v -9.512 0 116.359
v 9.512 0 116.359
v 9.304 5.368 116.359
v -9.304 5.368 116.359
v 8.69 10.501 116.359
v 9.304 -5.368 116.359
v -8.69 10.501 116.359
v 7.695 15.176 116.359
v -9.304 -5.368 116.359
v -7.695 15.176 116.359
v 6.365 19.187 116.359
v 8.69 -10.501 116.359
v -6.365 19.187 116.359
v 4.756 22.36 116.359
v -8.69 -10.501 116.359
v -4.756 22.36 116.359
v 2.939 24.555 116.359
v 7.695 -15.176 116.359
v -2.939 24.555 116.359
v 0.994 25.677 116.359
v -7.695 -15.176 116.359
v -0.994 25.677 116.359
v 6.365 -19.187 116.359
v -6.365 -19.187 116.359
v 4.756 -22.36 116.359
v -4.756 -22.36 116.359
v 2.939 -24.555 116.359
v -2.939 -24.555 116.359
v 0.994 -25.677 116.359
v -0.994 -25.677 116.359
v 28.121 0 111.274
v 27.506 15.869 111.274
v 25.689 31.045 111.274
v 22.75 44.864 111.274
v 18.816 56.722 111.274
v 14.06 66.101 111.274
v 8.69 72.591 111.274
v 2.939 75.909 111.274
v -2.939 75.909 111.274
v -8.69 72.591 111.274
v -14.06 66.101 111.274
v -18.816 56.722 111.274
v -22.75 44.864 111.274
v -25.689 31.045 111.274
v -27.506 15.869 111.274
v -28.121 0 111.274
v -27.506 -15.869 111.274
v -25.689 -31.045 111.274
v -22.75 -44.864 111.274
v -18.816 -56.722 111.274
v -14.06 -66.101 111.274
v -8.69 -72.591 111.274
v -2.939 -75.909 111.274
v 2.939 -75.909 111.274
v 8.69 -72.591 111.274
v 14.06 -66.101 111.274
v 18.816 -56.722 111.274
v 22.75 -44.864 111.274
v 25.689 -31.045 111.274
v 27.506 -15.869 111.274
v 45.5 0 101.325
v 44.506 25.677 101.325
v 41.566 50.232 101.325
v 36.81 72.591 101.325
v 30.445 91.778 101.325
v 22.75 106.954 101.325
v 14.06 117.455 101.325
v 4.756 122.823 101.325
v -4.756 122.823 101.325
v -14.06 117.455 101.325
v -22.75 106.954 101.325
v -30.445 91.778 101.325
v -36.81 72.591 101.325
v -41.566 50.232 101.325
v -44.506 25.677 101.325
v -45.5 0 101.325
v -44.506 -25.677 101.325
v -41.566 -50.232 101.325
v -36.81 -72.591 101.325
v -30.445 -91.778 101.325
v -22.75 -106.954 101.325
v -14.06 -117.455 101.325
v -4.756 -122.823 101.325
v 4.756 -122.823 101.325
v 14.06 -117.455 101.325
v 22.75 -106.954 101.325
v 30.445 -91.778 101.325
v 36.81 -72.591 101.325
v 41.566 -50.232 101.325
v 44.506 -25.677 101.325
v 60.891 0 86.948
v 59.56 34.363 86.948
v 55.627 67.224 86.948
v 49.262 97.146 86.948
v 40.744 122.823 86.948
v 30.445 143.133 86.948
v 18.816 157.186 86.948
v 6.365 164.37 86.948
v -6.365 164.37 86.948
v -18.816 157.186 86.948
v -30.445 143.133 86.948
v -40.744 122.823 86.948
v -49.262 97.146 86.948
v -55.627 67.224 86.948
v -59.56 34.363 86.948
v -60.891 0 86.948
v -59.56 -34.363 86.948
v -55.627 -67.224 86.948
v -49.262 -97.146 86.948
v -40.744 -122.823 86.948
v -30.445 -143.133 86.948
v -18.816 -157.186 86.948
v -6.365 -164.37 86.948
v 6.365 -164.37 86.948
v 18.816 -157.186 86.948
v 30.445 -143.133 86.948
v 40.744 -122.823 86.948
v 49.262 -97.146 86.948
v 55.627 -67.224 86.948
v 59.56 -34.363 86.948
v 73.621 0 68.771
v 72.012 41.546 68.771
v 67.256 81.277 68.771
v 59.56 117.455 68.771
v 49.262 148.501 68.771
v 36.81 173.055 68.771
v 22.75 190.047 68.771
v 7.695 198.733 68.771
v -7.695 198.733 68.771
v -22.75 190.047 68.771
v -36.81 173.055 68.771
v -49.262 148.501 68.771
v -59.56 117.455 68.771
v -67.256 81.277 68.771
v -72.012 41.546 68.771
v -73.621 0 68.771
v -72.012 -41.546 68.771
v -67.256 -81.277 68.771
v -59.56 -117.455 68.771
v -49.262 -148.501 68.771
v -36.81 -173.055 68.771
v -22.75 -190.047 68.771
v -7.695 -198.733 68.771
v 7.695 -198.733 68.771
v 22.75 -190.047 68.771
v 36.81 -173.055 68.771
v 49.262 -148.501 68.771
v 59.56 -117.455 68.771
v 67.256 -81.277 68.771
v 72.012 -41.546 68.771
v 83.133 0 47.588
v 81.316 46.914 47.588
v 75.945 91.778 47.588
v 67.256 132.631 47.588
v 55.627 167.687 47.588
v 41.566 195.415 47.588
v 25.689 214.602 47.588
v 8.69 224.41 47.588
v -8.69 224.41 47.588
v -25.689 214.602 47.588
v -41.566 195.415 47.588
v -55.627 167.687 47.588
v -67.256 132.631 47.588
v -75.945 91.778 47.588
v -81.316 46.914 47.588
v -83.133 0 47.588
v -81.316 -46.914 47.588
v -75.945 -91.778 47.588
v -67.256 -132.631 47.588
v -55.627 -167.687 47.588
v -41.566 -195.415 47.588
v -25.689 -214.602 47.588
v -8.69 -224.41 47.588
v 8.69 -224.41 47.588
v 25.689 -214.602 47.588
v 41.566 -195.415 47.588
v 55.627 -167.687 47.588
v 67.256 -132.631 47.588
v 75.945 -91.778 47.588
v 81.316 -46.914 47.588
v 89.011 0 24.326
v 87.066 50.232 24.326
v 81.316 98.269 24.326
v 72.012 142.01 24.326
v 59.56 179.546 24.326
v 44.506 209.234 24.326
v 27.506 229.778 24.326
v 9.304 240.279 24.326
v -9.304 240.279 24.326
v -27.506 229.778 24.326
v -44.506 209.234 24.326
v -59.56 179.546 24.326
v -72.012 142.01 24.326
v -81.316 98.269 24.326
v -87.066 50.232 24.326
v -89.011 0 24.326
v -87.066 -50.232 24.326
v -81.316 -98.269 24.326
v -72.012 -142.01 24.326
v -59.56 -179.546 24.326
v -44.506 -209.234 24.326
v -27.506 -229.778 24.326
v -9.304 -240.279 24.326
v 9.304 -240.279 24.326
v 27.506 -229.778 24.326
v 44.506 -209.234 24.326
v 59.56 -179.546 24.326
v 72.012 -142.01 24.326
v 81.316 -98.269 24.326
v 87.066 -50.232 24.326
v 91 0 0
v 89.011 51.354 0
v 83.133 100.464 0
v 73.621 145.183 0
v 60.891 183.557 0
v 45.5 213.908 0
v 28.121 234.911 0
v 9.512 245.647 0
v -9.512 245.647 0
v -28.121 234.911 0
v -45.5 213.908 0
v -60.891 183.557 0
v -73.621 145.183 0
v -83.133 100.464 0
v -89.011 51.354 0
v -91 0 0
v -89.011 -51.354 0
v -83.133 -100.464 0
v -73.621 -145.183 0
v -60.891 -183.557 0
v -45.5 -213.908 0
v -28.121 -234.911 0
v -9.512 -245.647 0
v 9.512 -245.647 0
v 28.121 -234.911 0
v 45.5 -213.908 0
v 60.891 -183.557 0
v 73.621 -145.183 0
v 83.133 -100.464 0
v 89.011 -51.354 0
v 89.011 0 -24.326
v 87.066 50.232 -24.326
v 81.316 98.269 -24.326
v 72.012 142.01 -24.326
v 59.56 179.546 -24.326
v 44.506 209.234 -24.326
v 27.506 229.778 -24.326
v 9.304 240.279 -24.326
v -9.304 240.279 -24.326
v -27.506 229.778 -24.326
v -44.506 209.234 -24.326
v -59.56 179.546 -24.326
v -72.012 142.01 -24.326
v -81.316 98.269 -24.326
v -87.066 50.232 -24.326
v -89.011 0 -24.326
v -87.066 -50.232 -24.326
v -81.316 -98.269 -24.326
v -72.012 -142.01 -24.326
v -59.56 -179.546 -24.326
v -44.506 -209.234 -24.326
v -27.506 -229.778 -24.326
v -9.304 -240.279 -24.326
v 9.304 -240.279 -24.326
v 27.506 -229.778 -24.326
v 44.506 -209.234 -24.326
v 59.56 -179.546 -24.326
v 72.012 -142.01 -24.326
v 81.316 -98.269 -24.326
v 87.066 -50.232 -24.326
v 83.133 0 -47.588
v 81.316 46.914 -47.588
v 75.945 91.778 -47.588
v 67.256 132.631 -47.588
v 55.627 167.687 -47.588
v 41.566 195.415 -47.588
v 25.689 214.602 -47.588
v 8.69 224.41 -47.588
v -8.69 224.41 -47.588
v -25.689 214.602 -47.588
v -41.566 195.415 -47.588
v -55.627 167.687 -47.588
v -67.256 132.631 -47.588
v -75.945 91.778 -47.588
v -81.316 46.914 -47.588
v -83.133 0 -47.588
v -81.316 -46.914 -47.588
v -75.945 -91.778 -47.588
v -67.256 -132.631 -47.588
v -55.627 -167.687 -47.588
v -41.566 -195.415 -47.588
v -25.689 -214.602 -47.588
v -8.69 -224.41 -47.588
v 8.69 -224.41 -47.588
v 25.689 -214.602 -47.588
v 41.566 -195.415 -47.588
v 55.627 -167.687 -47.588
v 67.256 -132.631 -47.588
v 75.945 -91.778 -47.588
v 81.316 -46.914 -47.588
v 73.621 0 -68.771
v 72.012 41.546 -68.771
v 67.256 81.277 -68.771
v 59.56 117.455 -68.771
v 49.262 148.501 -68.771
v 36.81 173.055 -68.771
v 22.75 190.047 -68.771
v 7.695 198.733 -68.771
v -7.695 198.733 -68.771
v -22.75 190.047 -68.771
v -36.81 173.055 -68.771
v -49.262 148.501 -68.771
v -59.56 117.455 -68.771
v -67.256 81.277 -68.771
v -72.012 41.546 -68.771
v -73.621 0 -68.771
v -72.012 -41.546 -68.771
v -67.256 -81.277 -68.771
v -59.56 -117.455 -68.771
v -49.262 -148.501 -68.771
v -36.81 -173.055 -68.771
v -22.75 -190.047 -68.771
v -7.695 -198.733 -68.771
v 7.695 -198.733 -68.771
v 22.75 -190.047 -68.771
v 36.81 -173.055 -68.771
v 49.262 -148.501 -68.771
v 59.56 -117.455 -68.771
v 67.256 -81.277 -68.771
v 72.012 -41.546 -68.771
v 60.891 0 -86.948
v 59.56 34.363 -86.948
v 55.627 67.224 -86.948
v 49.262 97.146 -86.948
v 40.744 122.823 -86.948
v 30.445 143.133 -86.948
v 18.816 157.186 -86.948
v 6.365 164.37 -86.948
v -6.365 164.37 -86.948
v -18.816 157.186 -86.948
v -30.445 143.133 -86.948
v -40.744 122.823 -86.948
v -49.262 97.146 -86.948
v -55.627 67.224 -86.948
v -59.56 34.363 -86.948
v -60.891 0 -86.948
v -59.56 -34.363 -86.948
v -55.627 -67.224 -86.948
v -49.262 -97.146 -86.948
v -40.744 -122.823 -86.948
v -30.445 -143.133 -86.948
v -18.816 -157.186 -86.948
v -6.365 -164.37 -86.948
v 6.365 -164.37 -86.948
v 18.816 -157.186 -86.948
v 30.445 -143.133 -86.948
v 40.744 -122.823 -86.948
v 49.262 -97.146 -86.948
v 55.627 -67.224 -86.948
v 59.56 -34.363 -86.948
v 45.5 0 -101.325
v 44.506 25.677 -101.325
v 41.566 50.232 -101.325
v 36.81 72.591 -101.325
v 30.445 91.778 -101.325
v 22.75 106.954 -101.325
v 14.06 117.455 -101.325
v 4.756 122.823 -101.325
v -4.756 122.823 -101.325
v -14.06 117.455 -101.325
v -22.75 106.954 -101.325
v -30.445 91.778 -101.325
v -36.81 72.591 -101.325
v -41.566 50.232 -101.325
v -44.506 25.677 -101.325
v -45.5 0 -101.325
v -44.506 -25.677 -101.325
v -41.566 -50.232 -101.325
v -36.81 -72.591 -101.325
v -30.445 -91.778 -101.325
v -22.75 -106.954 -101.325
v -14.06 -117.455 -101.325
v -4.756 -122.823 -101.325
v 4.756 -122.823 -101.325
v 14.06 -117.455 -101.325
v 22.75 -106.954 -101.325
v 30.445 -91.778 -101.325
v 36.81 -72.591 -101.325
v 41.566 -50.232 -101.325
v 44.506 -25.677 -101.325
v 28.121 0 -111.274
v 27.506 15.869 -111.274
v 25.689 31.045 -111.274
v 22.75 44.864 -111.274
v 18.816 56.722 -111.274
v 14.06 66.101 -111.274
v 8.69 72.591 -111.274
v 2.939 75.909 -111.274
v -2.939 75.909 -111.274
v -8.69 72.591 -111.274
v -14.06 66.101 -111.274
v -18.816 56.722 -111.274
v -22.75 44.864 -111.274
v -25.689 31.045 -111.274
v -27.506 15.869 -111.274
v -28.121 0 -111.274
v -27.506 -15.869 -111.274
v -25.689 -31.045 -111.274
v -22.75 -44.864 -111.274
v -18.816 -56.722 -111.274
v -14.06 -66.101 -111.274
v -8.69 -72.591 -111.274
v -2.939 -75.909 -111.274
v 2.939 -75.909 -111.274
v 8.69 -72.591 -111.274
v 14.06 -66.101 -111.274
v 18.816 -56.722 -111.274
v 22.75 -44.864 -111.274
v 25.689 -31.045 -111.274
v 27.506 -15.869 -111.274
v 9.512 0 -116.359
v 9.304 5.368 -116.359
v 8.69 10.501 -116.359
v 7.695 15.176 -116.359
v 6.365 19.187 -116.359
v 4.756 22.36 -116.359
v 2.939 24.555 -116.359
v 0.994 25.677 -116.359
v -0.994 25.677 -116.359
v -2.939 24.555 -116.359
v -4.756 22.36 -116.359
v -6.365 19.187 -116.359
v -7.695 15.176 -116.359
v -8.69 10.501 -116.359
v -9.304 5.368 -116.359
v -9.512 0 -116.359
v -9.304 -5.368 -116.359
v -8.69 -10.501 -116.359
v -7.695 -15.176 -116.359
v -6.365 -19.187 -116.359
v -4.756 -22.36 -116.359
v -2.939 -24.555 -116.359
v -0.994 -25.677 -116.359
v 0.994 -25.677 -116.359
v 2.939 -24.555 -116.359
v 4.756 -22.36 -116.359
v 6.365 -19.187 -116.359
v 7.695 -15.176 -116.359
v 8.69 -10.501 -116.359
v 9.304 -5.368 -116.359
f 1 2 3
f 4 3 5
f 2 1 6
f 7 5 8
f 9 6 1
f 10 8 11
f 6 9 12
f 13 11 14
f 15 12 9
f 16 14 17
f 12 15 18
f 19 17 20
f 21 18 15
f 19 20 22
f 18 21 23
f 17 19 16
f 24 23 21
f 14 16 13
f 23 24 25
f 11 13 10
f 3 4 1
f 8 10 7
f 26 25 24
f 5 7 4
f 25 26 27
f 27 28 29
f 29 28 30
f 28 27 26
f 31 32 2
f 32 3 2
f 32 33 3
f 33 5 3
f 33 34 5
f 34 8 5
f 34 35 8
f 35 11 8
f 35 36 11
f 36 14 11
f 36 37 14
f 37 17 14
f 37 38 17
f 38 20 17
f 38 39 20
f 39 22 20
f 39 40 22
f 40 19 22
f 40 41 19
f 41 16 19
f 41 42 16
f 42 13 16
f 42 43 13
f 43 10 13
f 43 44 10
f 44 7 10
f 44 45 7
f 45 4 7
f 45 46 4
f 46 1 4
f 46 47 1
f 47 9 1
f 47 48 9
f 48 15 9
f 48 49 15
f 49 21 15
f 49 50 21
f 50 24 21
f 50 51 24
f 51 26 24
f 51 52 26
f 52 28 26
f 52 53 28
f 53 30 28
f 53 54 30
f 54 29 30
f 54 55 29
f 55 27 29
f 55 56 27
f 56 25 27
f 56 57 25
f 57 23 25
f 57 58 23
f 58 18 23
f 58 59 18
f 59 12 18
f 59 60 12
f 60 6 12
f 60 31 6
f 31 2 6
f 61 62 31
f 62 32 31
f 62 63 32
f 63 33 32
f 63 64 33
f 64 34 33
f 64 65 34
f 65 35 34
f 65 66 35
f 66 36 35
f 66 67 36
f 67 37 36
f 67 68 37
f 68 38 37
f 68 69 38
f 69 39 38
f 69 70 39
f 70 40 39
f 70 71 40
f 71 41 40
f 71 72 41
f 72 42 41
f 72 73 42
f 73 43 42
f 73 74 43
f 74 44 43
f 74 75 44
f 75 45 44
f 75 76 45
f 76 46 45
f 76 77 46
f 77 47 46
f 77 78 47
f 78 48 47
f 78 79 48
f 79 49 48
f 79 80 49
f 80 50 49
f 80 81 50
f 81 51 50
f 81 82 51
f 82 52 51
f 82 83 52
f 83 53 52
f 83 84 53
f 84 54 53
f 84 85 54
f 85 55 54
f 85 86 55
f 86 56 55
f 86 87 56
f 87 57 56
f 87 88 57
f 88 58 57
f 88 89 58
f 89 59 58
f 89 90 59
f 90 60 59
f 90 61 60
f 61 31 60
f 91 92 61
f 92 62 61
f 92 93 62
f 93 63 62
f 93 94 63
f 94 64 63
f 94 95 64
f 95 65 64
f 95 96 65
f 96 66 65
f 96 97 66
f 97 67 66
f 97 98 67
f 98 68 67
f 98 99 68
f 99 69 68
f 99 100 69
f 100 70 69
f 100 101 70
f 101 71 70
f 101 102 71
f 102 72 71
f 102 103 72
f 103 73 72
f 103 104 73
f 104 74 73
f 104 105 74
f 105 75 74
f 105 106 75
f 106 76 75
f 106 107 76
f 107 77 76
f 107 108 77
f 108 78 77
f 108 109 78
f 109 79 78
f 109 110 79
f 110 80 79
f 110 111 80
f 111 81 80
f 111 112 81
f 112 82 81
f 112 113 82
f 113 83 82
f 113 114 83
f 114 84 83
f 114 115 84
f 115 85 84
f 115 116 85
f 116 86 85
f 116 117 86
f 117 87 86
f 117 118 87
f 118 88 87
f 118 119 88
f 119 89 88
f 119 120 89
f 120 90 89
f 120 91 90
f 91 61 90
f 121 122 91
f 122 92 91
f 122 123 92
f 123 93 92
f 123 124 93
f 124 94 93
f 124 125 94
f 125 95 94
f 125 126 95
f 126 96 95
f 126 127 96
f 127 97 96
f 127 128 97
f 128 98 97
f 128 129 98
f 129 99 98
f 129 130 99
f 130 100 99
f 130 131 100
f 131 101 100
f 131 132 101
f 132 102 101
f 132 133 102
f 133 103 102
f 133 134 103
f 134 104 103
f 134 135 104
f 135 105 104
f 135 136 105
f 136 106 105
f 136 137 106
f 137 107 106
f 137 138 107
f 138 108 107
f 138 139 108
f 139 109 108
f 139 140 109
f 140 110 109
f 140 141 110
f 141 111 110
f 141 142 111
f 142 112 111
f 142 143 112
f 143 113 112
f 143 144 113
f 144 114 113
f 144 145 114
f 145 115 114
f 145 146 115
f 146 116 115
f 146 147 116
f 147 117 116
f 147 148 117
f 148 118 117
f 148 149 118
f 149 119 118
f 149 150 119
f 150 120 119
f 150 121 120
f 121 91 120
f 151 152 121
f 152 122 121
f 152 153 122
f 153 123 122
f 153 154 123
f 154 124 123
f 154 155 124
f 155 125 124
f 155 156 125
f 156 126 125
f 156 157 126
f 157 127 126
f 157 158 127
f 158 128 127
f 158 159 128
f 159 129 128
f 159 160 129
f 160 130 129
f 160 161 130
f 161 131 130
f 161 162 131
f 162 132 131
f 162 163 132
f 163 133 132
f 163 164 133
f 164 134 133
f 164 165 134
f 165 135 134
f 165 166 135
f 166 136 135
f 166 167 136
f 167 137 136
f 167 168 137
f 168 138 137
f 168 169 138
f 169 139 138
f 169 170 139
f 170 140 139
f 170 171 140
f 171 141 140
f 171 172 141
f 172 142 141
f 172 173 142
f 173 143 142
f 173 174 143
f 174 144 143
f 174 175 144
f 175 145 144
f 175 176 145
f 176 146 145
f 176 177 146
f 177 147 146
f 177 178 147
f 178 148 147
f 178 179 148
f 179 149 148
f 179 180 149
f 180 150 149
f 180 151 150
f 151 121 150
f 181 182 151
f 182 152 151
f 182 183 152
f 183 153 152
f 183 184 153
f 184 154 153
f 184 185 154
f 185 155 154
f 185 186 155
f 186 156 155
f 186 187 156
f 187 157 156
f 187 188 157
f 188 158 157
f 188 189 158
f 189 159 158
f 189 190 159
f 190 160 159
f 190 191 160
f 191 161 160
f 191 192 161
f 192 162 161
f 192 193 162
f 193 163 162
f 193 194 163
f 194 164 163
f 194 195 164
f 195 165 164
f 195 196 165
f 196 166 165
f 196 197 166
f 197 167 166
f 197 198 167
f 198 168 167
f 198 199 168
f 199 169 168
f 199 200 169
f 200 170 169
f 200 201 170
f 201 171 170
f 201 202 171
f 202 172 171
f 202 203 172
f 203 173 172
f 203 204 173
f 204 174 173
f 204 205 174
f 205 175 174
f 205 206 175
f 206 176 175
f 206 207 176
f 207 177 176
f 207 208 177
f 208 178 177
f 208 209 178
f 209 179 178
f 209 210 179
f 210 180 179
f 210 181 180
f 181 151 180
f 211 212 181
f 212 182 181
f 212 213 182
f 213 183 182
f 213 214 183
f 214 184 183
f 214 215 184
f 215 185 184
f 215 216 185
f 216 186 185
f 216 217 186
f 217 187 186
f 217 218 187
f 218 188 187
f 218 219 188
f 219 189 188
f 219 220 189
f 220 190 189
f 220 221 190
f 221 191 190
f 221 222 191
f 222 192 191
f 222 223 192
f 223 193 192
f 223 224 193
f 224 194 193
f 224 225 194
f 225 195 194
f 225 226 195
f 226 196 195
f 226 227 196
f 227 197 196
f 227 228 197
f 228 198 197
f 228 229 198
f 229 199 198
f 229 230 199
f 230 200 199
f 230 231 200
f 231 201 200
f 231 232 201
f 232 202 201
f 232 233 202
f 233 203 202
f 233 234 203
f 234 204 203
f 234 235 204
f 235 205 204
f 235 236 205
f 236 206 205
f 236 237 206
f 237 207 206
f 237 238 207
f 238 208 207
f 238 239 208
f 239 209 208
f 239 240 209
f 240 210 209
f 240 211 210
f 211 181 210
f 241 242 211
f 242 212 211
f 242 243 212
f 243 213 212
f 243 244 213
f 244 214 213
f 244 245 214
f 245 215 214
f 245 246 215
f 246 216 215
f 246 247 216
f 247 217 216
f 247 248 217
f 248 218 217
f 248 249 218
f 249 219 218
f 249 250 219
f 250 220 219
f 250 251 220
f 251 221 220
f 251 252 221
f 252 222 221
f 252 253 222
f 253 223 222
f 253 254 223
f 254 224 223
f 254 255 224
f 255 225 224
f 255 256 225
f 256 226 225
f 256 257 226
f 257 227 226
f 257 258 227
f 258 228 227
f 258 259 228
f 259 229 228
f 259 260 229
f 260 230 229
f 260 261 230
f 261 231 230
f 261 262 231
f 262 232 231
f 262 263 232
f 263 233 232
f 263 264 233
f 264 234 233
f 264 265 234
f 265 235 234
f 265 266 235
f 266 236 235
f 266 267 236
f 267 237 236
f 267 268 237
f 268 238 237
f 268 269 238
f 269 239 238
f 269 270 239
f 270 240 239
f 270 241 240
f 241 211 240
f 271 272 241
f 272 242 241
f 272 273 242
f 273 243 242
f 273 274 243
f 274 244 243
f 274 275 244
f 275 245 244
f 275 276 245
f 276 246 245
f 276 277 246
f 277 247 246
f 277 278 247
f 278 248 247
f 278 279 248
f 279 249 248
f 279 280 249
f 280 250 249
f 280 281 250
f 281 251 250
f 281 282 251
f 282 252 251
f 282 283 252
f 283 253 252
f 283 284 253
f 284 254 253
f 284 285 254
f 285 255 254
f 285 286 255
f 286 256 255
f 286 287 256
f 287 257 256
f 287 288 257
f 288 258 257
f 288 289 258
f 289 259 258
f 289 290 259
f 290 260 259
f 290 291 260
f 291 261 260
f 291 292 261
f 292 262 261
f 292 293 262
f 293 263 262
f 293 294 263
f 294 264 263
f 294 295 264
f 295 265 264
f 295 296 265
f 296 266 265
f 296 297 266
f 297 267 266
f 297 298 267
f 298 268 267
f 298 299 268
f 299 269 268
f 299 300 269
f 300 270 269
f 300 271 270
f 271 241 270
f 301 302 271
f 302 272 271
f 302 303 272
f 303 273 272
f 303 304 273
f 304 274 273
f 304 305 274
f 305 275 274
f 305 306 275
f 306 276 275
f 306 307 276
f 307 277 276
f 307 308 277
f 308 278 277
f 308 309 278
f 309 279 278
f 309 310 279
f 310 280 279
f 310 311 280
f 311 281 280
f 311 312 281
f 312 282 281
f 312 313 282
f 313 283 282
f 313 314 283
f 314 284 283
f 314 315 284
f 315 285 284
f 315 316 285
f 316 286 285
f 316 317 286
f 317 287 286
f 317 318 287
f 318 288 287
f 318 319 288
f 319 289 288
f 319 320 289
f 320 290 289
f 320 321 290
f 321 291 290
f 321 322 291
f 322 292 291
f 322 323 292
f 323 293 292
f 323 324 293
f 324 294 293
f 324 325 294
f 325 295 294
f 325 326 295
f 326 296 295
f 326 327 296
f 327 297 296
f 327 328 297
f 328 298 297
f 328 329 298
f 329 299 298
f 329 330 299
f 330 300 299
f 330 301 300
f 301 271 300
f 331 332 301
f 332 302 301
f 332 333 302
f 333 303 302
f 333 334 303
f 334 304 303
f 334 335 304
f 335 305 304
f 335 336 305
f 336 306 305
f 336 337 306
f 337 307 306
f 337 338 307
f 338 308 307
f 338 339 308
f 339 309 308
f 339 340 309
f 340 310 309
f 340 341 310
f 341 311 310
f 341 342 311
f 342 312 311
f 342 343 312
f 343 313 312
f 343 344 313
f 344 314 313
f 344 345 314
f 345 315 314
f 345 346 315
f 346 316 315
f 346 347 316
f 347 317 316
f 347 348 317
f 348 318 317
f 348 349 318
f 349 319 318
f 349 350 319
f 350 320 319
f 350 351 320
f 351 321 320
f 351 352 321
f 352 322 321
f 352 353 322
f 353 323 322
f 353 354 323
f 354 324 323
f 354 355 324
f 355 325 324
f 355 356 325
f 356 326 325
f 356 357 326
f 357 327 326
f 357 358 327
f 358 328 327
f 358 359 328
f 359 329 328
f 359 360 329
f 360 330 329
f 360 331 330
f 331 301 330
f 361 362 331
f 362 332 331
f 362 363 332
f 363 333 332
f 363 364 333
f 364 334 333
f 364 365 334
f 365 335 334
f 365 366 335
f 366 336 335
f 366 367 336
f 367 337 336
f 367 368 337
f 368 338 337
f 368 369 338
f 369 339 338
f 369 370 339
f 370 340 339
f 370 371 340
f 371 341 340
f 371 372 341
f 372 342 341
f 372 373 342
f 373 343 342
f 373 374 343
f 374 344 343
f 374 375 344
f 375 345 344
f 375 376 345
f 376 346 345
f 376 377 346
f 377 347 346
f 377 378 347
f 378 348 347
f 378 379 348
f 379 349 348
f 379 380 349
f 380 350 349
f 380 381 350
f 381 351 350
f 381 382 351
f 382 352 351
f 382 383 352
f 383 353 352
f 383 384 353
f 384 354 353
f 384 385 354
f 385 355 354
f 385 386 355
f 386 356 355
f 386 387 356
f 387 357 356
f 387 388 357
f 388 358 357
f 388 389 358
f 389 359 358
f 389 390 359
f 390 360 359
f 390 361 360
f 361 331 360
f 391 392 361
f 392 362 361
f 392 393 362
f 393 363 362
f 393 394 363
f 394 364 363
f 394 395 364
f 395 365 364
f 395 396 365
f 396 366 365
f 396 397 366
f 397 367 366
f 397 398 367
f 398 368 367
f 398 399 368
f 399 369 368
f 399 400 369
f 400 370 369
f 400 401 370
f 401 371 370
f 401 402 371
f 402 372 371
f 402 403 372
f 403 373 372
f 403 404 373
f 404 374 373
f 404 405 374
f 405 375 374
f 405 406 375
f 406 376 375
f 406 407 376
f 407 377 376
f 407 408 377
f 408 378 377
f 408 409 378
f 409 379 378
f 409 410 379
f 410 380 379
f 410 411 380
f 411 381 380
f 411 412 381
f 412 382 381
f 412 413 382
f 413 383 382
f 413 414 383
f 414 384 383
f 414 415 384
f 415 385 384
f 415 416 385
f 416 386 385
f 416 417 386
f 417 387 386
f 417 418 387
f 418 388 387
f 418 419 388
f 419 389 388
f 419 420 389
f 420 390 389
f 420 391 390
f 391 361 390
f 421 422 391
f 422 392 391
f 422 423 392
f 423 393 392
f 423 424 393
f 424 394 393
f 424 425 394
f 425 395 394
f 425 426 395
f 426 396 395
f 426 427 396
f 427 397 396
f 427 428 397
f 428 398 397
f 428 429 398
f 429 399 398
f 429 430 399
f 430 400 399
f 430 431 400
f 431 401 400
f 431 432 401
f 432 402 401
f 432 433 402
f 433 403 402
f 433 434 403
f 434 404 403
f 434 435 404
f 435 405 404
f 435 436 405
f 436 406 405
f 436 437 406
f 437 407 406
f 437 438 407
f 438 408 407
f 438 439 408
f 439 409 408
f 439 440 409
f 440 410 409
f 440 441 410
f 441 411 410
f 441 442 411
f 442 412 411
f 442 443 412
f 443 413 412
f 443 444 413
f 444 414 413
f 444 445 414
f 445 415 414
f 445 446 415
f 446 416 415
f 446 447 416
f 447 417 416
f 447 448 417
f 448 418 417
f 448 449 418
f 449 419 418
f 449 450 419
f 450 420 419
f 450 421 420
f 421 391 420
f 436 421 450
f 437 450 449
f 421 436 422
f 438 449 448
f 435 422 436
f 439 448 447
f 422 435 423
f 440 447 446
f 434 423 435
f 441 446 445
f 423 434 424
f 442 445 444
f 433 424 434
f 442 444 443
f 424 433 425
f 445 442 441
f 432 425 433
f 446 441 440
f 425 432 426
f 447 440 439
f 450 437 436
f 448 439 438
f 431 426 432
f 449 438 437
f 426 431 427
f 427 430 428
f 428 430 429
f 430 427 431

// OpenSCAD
// Generated by SolidPython 1.0.1 on 2020-07-29 00:46:48


scale(v = [7, 19, 9]) {
	sphere(r = 13);
}
/***********************************************
*********      SolidPython code:      **********
************************************************
 
# import packages: SolidPython
from solid import *
from solid.utils import *
from itertools import chain, combinations, permutations


class Resize:

    def __init__(self, scad_file):
        self.scad_file = scad_file
        #self.scad_file = import_scad(scad_file)
        # cone/cylinder param:
        self.r1 = 0
        self.r2 = 0
        self.h = 0
        # rectangular prism param:
        self.w = 0
        self.l = 0
        # ellipse param:
        self.r = 0

    # import OpenScad code (file name corresponds to shape)


    # classify shape + parameters
    def assign(self, param1, param2, param3):
        if self.scad_file == 'cone.scad':
            self.r1 = param1
            self.r2 = param2
            self.h = param3
        elif self.scad_file == 'cylinder.scad':
            self.r1 = param1
            self.r2 = param2
            self.h = param3
        elif self.scad_file == 'rectangularPrism.scad':
            self.h = param1
            self.l = param2
            self.w = param3
        else:
            self.r = param1
            self.h = param2

    # resize parameters
    def iterate(self):
        x = range(3, 20, 2)
        i = 1
        if self.scad_file == 'cone.scad':
            tempList = list(permutations(x, 2))
            for temp in tempList:
                param1 = temp[0]
                param2 = temp[1]
                filepath = 'produced_scad_files/' + 'cone' + str(param1) + '_' + str(param2) + '_' + '.scad'
                scad_render_to_file(cylinder(h=param1, r1=param2, r2=0), filepath)

        elif self.scad_file == 'cylinder.scad':
            tempList = list(permutations(x, 3))
            for temp in tempList:
                param1 = temp[0]
                param2 = temp[1]
                filepath = 'produced_scad_files/' + 'cylinder' + str(param1) + '_' + str(param2) + '_' + '.scad'
                scad_render_to_file(cylinder(h=param1, r1=param2, r2=param2), filepath)

        elif self.scad_file == 'rectangularPrism.scad':
            tempList = list(permutations(x, 3))
            for temp in tempList:
                param1 = temp[0]
                param2 = temp[1]
                param3 = temp[2]
                filepath = 'produced_scad_files/' + 'rectangularPrism' + str(param1) + '_' + str(param2) + '_' + str(
                    param3) + '.scad'
                scad_render_to_file(cube(size=(param1, param2, param3)), filepath)

        elif self.scad_file == 'ellipse.scad':
            tempList = list(permutations(x, 4))
            for temp in tempList:
                param1 = temp[0]
                param2 = temp[1]
                param3 = temp[2]
                param4 = temp[3]
                filepath = 'produced_scad_files/' + 'ellipse' + str(param1) + '_' + str(param2) + '_' + str(param3) + '_' + str(param4) + '.scad'
                scad_render_to_file(scale([param1, param2, param3])(sphere(r=param4)), filepath)

    def render_to_scadfile(self):
        scad_render_to_file(scad, 'example.scad') 
 
************************************************/
